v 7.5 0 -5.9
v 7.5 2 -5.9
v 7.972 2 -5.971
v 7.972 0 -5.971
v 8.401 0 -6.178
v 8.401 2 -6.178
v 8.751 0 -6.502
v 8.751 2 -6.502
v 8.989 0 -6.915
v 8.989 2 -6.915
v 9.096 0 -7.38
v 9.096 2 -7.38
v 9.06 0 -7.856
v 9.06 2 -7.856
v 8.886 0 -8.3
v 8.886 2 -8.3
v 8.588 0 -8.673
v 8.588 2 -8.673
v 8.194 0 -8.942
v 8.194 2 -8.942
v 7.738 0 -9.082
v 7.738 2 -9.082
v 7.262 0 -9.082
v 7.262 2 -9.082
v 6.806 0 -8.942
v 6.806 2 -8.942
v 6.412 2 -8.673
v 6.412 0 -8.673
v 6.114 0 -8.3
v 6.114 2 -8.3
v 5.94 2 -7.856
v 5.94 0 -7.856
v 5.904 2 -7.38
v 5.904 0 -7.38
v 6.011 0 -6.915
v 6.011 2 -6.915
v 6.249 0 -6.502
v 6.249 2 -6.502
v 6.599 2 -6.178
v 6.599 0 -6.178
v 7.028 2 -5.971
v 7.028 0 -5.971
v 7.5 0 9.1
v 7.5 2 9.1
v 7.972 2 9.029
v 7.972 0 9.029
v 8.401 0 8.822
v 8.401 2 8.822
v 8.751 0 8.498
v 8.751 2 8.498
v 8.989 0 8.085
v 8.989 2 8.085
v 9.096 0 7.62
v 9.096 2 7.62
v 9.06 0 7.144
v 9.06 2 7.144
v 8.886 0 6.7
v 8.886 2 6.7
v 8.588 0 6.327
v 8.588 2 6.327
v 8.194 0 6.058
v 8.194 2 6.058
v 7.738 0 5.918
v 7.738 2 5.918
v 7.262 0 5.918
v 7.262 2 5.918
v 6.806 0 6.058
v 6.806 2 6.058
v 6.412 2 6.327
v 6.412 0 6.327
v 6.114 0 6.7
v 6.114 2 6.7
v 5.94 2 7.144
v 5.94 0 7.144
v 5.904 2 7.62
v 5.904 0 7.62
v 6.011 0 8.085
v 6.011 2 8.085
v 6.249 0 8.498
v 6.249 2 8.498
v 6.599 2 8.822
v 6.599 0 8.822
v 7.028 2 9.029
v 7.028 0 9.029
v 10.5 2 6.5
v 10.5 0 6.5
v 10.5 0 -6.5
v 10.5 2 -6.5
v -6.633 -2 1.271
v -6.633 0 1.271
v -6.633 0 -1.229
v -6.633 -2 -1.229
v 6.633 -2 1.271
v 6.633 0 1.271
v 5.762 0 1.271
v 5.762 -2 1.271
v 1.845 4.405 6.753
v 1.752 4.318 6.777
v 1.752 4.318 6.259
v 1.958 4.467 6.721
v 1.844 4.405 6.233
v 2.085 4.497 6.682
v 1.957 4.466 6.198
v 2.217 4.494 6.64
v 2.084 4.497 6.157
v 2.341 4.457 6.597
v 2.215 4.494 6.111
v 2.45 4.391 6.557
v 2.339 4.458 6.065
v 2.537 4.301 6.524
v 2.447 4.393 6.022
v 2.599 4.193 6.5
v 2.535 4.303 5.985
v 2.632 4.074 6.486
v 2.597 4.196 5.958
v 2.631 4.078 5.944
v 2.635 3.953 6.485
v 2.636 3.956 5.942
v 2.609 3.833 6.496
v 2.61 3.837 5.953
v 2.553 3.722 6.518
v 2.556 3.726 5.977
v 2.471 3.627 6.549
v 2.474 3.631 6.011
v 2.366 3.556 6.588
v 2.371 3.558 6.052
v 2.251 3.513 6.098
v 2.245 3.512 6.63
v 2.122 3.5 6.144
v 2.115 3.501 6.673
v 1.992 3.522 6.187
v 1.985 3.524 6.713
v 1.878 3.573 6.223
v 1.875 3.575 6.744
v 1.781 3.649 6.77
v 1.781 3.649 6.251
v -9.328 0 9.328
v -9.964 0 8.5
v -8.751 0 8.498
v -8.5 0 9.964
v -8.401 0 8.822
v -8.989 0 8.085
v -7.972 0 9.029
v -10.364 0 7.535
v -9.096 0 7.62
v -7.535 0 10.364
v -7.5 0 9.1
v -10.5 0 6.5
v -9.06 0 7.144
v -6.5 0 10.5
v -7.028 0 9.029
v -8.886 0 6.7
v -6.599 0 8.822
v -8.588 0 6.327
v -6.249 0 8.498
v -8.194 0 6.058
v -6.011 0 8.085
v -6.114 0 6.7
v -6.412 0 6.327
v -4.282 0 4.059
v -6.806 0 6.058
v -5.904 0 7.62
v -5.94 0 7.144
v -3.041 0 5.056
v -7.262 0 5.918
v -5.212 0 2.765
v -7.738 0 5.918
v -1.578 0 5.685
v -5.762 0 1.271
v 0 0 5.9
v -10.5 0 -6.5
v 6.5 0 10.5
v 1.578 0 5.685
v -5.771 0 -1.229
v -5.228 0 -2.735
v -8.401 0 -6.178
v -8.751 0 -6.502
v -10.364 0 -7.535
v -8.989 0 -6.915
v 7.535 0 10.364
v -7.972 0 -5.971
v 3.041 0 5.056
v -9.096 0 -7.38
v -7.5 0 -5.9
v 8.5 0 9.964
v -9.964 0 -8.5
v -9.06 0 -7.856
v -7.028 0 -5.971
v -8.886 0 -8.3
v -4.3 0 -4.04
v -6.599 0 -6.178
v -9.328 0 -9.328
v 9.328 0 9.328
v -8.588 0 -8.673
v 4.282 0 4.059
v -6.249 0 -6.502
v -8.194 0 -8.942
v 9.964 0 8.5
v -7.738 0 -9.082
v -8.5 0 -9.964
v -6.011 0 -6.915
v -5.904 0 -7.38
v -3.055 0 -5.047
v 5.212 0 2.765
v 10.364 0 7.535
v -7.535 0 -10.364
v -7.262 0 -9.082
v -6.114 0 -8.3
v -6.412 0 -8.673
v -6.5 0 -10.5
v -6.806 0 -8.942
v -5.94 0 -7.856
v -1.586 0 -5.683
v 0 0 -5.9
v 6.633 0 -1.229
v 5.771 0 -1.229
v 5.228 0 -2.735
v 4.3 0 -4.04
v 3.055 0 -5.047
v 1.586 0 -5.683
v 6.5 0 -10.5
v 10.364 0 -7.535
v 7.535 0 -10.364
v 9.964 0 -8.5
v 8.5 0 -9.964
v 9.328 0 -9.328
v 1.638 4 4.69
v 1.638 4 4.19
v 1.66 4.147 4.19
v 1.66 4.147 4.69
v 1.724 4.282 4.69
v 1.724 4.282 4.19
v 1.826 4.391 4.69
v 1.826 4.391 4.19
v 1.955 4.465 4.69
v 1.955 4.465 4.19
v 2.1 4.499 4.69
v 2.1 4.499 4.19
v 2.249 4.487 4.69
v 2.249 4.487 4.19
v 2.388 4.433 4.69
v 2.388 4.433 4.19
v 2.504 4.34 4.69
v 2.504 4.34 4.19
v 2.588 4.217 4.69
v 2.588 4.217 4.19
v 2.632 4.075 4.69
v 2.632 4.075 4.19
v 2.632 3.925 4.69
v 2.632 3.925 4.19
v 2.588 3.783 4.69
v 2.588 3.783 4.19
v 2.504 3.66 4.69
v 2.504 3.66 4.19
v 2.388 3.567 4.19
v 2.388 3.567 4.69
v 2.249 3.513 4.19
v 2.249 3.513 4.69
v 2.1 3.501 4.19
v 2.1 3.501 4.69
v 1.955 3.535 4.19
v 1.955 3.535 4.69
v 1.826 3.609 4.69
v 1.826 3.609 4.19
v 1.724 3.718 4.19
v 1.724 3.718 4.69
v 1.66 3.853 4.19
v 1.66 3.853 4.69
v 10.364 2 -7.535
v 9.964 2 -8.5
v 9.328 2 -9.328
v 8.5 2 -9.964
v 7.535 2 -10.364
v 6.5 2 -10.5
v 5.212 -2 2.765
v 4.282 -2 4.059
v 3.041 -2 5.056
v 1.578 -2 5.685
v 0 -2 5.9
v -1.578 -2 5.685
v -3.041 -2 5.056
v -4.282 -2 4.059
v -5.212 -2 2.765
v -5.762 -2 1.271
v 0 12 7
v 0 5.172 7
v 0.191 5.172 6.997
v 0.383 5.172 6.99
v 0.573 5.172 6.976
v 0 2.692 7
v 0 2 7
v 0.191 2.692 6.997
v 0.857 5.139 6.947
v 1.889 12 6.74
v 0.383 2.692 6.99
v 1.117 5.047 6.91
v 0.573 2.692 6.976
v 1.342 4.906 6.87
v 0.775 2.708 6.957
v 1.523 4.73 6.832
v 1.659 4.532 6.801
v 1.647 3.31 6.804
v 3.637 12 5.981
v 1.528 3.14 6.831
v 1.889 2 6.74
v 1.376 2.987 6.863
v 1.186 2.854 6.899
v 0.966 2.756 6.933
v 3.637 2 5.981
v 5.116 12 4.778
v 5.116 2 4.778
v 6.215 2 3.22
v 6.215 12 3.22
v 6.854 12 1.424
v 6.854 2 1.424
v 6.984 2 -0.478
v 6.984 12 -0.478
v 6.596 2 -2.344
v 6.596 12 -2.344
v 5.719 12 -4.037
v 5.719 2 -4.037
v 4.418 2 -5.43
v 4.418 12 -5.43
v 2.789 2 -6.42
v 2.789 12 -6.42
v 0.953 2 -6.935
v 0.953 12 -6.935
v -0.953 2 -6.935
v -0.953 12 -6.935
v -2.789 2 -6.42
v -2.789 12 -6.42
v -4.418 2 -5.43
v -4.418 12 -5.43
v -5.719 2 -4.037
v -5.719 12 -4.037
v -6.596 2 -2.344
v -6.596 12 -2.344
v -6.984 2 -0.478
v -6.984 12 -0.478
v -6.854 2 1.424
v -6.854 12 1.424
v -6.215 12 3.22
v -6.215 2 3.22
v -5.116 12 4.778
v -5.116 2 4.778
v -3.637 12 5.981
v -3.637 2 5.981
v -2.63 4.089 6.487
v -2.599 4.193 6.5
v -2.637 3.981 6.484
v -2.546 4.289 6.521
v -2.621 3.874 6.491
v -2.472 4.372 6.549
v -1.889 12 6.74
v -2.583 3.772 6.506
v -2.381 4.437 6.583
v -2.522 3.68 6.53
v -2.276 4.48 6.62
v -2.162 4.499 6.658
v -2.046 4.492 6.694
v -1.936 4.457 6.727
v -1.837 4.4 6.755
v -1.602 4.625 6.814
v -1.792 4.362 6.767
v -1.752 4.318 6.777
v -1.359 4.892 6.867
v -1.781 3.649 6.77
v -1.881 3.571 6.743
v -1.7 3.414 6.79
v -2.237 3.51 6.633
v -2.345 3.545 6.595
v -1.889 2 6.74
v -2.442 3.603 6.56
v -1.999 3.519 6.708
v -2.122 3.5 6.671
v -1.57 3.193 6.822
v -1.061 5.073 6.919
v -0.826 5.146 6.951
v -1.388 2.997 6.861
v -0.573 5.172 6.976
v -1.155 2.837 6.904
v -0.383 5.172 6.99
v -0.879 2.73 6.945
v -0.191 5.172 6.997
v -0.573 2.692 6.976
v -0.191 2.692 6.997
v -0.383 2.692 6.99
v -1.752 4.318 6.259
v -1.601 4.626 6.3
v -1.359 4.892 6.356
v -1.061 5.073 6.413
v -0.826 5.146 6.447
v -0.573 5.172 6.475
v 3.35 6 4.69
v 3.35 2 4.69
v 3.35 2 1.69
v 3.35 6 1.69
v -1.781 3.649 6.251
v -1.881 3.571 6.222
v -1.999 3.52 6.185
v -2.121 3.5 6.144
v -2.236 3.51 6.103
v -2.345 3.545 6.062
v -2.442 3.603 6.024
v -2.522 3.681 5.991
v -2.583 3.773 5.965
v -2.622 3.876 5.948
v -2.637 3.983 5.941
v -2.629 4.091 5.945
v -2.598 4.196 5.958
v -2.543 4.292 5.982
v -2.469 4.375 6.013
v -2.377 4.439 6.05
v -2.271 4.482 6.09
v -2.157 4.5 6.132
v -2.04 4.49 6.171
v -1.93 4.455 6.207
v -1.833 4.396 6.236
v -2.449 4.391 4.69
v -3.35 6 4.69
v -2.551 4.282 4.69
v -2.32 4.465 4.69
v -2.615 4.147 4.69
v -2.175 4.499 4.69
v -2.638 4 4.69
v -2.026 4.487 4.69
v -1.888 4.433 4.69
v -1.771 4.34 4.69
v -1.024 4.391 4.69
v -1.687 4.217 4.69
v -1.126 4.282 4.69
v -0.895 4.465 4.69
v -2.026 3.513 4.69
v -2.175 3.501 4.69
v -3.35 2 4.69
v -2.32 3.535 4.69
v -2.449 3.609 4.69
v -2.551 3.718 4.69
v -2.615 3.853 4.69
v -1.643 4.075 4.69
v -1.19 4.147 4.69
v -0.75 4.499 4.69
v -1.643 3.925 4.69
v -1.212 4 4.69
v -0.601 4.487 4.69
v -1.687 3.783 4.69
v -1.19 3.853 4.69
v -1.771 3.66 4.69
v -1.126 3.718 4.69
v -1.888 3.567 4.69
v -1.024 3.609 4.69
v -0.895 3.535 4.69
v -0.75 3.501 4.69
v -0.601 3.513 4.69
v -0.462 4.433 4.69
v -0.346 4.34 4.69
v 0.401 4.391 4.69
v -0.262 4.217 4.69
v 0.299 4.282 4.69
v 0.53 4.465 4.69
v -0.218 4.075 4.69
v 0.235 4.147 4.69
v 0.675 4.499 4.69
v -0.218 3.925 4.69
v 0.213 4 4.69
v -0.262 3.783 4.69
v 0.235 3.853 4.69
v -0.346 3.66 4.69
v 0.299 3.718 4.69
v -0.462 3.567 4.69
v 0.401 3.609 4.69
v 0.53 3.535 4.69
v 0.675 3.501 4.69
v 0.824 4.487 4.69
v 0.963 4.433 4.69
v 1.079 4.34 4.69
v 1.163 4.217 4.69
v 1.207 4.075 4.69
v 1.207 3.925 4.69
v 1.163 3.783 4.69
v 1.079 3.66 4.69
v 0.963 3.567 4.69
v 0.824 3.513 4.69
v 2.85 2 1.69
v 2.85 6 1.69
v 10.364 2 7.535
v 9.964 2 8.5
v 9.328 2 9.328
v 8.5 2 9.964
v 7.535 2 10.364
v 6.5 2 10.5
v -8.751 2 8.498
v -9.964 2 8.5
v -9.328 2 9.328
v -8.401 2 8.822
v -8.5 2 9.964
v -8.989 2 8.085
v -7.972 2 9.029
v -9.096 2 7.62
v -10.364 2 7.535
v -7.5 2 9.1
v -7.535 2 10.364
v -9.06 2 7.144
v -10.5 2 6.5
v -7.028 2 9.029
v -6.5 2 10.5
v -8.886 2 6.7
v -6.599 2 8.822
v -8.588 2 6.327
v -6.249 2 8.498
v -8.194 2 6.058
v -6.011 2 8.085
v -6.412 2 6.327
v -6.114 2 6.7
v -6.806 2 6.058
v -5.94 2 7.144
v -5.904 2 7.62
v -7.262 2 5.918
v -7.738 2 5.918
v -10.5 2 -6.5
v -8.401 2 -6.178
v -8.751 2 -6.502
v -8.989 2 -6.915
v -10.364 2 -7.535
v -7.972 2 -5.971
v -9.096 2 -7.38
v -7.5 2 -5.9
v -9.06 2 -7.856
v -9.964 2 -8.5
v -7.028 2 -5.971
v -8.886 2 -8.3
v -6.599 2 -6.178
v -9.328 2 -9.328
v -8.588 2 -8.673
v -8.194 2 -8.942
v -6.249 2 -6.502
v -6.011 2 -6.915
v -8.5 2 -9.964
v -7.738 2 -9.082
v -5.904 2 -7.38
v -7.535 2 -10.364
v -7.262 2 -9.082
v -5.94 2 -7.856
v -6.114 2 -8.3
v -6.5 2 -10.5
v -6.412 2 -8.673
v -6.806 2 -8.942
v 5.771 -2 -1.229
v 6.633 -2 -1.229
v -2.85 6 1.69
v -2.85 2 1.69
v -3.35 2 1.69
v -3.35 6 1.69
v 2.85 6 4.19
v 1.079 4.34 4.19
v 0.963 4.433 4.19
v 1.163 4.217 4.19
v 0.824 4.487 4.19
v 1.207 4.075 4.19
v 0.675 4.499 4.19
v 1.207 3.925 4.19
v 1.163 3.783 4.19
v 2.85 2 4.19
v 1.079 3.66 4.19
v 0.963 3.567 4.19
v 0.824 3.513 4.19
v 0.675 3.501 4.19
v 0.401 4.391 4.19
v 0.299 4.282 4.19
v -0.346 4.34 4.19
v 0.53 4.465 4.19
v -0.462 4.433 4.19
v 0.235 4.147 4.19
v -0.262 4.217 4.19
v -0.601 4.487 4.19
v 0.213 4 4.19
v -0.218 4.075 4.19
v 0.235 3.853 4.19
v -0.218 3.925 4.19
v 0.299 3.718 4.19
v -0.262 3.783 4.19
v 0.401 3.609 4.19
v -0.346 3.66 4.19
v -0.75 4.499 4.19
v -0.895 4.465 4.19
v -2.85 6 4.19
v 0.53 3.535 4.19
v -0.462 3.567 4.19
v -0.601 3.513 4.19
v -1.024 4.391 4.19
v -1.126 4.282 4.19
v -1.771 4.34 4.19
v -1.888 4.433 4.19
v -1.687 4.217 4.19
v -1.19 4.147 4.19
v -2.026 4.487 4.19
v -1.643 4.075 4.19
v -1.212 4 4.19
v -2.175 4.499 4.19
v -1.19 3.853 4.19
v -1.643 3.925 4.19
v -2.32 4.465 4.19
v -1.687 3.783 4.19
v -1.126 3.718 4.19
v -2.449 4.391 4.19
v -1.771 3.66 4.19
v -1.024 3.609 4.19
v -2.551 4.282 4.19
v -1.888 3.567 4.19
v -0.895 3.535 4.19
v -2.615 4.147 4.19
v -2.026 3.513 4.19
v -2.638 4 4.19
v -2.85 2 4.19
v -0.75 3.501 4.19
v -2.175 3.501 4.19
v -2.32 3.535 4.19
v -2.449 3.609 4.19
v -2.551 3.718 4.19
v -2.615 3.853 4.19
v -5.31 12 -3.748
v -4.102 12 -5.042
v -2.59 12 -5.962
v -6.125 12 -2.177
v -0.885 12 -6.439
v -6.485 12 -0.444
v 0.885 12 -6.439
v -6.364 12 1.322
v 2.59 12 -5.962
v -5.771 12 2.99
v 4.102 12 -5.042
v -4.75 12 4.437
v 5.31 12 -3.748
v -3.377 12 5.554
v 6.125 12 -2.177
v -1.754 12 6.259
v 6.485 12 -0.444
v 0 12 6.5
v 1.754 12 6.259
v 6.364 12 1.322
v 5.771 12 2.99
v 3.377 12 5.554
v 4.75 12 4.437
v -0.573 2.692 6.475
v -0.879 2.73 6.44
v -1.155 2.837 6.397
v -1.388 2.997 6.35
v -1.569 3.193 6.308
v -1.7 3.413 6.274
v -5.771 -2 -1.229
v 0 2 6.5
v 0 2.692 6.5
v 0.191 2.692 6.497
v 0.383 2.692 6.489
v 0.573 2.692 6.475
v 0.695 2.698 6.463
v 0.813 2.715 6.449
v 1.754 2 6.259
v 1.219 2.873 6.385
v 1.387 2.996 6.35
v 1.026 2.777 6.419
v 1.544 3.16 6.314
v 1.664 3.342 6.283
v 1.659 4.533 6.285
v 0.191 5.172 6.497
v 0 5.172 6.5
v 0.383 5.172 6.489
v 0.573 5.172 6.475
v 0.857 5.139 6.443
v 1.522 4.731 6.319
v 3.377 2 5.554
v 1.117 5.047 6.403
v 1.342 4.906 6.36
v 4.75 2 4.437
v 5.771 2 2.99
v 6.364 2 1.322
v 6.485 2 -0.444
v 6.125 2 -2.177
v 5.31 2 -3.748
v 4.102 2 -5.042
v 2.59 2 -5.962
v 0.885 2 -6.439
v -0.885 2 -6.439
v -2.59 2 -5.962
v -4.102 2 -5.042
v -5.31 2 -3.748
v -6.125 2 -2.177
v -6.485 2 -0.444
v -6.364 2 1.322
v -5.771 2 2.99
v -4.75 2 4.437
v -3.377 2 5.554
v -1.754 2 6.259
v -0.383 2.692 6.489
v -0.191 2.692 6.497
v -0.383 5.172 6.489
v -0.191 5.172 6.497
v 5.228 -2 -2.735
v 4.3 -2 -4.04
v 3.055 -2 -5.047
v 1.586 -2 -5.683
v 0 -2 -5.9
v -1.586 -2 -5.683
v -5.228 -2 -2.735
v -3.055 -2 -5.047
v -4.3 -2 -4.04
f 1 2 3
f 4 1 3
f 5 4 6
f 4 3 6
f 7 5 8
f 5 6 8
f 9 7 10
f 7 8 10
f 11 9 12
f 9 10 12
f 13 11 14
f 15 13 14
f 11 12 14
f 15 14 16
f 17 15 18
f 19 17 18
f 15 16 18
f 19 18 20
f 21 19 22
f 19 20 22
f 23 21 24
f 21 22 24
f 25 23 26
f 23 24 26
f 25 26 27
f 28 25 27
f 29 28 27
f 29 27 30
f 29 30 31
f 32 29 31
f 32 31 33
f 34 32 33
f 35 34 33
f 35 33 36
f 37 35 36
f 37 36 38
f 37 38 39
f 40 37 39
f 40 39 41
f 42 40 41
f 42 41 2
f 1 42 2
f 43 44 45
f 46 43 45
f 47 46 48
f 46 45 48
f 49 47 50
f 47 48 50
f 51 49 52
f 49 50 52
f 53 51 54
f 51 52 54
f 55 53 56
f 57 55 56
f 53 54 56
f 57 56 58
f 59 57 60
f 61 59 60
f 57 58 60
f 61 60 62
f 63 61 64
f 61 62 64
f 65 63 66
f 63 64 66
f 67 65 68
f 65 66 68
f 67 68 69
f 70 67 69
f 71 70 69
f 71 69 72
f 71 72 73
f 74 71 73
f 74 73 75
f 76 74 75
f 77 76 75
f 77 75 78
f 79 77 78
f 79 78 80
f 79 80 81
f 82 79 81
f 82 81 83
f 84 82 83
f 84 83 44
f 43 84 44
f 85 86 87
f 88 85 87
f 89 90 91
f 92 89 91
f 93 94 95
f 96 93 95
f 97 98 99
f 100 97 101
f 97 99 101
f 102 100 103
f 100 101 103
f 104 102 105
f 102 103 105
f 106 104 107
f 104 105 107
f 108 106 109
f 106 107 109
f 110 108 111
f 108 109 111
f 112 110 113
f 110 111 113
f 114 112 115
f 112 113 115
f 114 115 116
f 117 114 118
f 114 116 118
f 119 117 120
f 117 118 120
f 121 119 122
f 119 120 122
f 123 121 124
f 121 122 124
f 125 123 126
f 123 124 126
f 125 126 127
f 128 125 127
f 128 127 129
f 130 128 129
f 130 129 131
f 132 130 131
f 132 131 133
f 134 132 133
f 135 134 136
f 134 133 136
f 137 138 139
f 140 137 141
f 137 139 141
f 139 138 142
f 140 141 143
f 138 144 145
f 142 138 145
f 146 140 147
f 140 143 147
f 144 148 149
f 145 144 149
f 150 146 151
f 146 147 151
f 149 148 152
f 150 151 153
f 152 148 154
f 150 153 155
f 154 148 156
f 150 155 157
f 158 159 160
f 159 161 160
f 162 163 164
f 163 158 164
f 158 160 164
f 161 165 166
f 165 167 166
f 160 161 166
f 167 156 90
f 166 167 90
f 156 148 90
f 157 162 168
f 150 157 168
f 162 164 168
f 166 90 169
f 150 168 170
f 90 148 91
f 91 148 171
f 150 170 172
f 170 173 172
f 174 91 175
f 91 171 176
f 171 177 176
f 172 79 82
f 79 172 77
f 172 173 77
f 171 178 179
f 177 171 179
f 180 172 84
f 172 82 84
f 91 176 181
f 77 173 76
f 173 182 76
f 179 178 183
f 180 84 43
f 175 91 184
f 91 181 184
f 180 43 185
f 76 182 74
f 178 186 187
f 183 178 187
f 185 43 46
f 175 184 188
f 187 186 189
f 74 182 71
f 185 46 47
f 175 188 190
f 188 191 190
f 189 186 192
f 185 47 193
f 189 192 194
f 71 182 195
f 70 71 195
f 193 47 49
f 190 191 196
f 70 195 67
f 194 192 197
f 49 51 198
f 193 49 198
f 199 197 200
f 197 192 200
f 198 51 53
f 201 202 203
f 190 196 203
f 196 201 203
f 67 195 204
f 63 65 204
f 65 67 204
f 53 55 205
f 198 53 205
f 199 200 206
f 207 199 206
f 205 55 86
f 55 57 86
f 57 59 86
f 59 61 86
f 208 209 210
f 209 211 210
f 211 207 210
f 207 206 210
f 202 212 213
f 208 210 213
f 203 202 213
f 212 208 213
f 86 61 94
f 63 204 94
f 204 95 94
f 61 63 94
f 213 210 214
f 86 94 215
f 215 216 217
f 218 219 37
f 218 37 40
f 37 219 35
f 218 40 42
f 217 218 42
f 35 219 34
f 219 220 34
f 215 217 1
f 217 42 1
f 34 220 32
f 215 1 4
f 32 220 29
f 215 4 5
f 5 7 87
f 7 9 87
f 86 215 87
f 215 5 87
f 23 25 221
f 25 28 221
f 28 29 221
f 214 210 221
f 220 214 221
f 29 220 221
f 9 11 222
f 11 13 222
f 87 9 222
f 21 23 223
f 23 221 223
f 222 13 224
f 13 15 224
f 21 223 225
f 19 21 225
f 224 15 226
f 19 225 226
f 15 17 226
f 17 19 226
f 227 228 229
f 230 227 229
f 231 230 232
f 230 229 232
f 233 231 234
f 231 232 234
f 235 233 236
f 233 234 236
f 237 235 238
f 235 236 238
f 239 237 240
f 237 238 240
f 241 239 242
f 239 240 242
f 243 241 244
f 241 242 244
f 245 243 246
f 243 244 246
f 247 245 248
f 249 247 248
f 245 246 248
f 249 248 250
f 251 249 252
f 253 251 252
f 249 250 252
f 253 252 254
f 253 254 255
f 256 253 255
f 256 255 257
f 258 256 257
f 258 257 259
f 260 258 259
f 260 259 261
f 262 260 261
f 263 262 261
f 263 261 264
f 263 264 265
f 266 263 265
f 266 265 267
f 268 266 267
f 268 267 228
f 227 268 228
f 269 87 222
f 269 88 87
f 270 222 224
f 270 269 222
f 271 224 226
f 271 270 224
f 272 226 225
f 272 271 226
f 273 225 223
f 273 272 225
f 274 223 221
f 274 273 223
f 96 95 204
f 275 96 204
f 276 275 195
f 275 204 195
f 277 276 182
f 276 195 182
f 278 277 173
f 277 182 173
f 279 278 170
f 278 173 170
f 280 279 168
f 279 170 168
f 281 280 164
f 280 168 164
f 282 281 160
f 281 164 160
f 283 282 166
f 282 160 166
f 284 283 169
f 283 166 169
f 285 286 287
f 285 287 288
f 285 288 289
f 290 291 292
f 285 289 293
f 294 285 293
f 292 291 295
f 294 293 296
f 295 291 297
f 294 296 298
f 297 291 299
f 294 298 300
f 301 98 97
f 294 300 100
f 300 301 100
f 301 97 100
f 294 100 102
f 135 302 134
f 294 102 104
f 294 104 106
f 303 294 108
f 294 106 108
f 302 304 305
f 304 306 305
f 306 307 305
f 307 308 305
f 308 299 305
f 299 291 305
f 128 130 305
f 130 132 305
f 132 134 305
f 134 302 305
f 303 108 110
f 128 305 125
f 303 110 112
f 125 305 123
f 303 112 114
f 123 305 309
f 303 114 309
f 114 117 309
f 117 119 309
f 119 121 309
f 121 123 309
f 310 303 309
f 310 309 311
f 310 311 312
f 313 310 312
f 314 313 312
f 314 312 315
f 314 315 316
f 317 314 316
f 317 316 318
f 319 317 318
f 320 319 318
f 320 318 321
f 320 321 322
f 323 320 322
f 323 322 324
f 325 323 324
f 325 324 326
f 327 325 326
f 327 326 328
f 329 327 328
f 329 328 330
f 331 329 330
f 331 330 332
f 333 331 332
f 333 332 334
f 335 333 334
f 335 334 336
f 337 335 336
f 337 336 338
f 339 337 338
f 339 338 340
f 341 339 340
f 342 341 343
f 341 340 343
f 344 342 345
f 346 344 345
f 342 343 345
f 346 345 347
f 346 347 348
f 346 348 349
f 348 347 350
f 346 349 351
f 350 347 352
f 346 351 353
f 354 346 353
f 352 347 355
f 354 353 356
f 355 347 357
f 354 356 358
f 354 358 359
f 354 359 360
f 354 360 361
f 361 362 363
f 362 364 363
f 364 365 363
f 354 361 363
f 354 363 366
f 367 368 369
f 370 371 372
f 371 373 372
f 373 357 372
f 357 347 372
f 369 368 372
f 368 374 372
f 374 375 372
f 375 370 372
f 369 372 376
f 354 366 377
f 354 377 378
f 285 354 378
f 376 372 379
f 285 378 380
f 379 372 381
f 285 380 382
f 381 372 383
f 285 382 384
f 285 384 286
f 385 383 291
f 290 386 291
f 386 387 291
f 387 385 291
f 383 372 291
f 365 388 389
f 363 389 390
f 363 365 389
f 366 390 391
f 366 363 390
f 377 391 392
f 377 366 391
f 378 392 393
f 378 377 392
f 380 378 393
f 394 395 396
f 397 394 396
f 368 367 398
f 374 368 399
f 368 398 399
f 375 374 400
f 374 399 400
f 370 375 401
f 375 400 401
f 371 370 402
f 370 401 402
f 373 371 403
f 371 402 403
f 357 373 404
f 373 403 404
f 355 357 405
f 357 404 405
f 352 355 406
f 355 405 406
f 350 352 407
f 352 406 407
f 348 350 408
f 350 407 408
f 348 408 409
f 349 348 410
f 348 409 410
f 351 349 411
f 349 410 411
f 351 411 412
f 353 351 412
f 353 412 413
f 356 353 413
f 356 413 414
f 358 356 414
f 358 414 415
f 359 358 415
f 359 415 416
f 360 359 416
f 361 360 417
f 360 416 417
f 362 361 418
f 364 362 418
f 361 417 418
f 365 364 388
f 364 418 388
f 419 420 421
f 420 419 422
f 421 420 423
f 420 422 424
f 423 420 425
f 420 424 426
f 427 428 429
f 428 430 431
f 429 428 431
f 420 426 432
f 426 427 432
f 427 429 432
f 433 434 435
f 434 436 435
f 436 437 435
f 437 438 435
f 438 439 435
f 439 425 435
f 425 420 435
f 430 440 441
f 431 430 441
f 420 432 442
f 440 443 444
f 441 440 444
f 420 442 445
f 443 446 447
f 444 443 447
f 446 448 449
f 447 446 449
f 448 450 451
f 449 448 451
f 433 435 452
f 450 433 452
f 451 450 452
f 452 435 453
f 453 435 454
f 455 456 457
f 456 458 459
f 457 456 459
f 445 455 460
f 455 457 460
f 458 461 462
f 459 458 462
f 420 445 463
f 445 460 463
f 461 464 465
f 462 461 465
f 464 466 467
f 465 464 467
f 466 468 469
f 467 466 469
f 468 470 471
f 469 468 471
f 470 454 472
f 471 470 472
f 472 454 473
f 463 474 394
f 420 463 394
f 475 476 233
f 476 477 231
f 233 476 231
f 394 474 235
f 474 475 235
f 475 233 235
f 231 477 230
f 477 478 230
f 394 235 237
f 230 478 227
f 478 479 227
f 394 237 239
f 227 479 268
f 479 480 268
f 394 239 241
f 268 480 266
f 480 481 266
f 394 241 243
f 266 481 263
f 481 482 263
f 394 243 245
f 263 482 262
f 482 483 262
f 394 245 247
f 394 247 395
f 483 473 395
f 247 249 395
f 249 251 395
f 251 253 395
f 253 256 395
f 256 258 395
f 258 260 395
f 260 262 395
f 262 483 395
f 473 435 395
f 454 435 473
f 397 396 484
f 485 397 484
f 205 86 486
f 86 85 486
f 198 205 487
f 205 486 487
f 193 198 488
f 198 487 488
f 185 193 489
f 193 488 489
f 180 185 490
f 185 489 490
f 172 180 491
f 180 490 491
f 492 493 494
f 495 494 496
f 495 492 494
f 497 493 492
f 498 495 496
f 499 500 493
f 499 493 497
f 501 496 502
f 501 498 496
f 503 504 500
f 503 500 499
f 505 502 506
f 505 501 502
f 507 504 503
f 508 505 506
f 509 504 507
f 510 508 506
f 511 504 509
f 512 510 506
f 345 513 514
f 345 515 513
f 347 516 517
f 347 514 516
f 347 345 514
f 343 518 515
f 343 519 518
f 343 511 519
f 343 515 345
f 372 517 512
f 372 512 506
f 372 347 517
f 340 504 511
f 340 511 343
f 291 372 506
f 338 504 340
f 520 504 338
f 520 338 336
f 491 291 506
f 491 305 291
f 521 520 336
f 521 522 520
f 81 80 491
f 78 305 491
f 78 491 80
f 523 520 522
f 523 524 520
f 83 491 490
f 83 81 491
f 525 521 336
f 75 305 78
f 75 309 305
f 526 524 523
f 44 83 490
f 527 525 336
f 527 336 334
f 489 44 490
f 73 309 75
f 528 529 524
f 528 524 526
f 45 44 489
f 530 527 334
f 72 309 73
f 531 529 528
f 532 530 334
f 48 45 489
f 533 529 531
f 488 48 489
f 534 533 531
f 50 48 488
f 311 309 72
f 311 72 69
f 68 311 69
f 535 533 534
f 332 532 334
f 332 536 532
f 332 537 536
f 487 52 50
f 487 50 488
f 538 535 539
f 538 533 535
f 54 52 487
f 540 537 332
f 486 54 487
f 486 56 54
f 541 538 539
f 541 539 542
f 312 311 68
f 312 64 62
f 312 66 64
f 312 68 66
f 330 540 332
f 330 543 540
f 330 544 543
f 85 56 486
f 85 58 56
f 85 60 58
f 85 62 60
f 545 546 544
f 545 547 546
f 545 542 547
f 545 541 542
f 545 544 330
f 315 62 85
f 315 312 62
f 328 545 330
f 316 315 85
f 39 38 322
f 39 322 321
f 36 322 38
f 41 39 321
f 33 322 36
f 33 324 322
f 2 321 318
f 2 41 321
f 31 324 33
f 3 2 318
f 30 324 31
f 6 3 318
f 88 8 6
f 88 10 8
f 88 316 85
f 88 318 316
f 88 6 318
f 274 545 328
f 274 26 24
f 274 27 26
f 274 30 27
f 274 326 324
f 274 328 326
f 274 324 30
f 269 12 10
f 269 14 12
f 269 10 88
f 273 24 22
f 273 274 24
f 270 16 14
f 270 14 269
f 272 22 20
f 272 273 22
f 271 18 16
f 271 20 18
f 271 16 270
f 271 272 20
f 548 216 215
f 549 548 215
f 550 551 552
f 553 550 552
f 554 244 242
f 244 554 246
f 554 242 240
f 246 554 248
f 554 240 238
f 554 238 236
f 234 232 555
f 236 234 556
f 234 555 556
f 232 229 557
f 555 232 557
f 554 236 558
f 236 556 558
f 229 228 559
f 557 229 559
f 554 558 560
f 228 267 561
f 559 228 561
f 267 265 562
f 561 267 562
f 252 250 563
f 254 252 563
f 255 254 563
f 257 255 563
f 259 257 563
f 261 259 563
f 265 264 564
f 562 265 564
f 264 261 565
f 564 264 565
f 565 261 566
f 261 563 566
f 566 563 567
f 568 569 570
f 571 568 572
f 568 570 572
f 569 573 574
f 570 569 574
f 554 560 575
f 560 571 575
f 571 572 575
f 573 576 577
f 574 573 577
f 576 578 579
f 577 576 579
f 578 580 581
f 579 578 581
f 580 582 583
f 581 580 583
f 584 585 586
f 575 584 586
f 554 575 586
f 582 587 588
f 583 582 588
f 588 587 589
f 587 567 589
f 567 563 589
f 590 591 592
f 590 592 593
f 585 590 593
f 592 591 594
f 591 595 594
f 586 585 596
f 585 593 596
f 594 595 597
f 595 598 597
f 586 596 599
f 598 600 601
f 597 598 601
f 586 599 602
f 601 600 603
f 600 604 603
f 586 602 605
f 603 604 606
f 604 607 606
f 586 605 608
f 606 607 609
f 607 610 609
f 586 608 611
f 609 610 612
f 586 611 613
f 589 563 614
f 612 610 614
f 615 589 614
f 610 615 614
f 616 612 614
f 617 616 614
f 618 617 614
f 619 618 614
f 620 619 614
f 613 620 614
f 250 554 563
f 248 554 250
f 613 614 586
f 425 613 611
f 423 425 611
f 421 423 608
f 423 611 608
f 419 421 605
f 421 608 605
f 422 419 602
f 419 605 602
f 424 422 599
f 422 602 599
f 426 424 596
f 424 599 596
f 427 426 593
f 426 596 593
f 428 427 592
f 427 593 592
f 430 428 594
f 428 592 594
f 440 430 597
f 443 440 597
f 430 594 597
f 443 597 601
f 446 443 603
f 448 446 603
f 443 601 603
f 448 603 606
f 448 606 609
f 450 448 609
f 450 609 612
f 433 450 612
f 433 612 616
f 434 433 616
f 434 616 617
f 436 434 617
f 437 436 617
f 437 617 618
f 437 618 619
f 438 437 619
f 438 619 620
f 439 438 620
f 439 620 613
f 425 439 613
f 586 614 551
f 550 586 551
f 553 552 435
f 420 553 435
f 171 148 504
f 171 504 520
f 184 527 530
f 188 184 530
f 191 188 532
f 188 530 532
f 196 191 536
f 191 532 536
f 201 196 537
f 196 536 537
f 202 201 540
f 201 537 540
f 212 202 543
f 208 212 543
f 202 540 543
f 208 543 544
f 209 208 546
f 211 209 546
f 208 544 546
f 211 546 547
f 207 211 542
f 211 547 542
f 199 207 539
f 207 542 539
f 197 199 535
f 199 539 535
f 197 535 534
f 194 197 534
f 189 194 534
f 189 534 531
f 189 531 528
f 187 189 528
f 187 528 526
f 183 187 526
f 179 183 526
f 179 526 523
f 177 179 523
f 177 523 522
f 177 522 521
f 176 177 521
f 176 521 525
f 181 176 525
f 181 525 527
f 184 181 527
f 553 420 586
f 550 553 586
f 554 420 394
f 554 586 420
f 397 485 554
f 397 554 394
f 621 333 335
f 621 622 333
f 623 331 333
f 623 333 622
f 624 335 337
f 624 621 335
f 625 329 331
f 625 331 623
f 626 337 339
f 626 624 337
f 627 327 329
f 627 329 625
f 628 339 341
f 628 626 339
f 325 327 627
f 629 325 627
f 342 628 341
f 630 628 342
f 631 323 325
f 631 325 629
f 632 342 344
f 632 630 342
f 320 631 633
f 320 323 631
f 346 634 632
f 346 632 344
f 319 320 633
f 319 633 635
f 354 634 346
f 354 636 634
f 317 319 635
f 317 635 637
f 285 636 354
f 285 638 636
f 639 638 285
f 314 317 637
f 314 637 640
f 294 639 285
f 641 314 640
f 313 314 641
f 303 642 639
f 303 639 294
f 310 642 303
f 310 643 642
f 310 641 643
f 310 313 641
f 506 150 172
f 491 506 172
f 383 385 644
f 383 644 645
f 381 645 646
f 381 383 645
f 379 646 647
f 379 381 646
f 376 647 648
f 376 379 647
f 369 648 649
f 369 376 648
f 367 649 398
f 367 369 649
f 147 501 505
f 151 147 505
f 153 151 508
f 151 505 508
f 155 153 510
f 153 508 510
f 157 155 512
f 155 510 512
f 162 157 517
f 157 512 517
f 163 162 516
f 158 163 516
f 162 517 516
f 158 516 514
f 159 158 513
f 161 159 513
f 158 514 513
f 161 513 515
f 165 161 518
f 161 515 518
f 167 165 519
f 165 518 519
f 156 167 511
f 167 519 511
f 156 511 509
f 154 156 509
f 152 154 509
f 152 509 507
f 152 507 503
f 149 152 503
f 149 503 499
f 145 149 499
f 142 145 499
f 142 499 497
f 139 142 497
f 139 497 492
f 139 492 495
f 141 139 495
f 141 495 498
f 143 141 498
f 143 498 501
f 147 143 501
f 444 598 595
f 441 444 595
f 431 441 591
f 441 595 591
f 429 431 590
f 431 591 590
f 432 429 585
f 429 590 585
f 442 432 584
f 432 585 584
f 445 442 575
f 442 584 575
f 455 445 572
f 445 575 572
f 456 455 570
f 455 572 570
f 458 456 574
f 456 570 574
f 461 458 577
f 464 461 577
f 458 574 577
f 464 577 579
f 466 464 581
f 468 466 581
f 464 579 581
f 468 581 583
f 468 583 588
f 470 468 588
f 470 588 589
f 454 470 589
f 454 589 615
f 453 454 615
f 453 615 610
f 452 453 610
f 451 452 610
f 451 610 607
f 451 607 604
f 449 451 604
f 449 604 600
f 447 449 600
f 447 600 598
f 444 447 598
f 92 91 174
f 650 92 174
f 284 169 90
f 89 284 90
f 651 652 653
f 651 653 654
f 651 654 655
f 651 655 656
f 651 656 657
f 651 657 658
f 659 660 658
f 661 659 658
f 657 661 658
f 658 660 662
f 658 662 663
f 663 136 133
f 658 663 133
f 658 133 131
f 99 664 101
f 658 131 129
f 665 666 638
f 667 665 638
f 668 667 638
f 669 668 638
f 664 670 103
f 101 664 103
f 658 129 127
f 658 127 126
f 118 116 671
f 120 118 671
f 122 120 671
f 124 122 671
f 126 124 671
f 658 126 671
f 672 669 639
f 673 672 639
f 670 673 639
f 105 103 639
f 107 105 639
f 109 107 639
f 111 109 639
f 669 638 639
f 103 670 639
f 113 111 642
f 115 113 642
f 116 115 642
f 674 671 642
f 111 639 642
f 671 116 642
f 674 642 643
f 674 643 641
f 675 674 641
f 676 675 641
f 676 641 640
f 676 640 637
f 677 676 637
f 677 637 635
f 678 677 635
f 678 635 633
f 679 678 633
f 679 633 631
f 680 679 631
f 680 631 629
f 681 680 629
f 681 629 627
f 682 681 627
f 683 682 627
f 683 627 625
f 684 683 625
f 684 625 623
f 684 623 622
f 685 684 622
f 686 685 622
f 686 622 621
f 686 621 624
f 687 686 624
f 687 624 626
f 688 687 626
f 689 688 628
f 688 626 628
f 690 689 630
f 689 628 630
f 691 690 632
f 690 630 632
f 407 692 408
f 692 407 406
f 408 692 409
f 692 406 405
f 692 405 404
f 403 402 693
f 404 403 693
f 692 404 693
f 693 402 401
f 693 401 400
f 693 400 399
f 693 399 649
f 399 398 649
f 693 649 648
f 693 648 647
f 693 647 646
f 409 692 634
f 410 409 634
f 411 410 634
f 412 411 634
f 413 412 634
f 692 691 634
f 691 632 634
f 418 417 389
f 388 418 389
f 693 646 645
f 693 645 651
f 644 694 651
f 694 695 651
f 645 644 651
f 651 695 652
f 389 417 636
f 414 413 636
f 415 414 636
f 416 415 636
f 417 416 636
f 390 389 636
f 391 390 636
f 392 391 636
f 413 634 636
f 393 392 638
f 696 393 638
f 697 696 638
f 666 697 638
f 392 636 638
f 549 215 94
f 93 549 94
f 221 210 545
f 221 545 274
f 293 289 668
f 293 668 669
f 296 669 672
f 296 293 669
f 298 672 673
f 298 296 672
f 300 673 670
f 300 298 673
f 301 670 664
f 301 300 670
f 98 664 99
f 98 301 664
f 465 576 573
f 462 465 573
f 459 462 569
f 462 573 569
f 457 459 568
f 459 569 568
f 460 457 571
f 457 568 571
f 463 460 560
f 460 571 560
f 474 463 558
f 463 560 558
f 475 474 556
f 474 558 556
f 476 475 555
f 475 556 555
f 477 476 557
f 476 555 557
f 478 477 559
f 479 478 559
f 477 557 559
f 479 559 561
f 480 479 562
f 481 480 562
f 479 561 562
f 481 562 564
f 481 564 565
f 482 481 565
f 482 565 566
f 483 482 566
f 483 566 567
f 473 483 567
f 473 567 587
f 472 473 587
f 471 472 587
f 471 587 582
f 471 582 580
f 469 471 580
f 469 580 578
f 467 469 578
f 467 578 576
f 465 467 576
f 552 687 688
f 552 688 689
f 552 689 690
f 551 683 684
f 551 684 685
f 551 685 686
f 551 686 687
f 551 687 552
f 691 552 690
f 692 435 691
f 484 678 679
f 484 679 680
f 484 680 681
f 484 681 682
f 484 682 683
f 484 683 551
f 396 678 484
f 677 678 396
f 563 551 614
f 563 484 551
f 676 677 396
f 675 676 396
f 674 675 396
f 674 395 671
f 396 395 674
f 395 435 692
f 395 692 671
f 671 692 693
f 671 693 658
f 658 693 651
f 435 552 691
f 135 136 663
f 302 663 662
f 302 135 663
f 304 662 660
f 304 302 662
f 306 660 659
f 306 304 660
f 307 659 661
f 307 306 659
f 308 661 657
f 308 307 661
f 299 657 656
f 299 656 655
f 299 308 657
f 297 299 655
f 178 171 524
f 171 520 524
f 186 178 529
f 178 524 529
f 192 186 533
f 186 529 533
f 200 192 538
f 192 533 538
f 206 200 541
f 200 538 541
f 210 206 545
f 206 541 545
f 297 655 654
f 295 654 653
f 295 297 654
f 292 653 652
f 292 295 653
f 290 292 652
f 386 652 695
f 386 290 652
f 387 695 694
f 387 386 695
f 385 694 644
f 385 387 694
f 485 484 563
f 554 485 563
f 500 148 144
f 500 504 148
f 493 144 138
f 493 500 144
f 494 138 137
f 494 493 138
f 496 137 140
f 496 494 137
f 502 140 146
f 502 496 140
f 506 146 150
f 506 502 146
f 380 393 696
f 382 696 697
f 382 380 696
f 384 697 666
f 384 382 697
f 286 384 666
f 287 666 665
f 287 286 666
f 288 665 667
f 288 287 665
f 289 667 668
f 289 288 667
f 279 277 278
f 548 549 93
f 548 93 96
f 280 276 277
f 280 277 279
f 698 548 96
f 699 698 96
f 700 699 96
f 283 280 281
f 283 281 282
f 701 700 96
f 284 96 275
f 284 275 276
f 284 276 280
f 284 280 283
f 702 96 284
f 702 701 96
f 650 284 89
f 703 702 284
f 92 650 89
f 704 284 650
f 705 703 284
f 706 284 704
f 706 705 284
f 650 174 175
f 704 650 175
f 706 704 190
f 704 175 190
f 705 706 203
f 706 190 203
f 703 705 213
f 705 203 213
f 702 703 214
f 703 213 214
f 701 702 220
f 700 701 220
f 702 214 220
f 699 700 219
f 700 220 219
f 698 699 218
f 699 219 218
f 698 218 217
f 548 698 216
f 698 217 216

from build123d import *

# Parameters (mm, degrees)
SKETCH1_W               = 21
SKETCH1_H               = 21
BOSS_EXTRUDE1_DEPTH     = 2
BOSS_EXTRUDE2_START     = -2
BOSS_EXTRUDE2_DEPTH     = 2
SKETCH3_R               = 1.6
CUT_EXTRUDE1_DEPTH      = 16.378556499
SKETCH5_R               = 7
BOSS_EXTRUDE3_DEPTH     = 10
SKETCH6_R               = 6.5
CUT_EXTRUDE2_DEPTH      = 10
CUT_EXTRUDE3_REACH      = 25.675
CUT_EXTRUDE3_END_RADIUS = 6.5
BOSS_EXTRUDE4_DEPTH     = 4
SKETCH14_R              = 0.5
CUT_EXTRUDE4_DEPTH      = 10
FILLET1_R               = 4


with BuildPart() as part:
    # Sketch1 → Boss-Extrude1 (new body)
    with BuildSketch(Plane(origin=(0, 0, 0), x_dir=(1, 0, 0), z_dir=(0, 1, 0))):
        Rectangle(SKETCH1_W, SKETCH1_H)
    extrude(amount=BOSS_EXTRUDE1_DEPTH)

    # Sketch4 → Boss-Extrude2 (add)
    with BuildSketch(Plane(origin=(0, 2, 0), x_dir=(1, 0, 0), z_dir=(0, 1, 0)).offset(BOSS_EXTRUDE2_START)):
        with BuildLine():
            Line((-5.761508712, -1.270833333), (-6.632541509, -1.270833333))
            Line((-6.632541509, -1.270833333), (-6.632541509, 1.229166667))
            Line((-6.632541509, 1.229166667), (-5.770541509, 1.229166667))
            ThreePointArc((-5.770541509, 1.229166667), (0, 5.9), (5.770541509, 1.229166667))
            Line((5.770541509, 1.229166667), (6.632541509, 1.229166667))
            Line((6.632541509, 1.229166667), (6.632541509, -1.270833333))
            Line((6.632541509, -1.270833333), (5.761508712, -1.270833333))
            ThreePointArc((5.761508712, -1.270833333), (0, -5.9), (-5.761508712, -1.270833333))
        make_face()
    extrude(amount=-BOSS_EXTRUDE2_DEPTH)

    # Sketch3 → Cut-Extrude1 (cut, through all)
    with BuildSketch(Plane(origin=(0, 2, 0), x_dir=(1, 0, 0), z_dir=(0, 1, 0))):
        with Locations(Location((-7.5, 7.5, 0), (0, 0, 270))):
            Circle(SKETCH3_R)
        with Locations(Location((7.5, 7.5, 0), (0, 0, 270))):
            Circle(SKETCH3_R)
        with Locations(Location((7.5, -7.5, 0), (0, 0, 270))):
            Circle(SKETCH3_R)
        with Locations(Location((-7.5, -7.5, 0), (0, 0, 270))):
            Circle(SKETCH3_R)
    extrude(amount=-CUT_EXTRUDE1_DEPTH, mode=Mode.SUBTRACT)

    # Sketch5 → Boss-Extrude3 (add)
    with BuildSketch(Plane(origin=(0, 2, 0), x_dir=(1, 0, 0), z_dir=(0, 1, 0))):
        with Locations(Location((0, 0, 0), (0, 0, 270))):
            Circle(SKETCH5_R)
    extrude(amount=BOSS_EXTRUDE3_DEPTH)

    # Sketch6 → Cut-Extrude2 (cut)
    with BuildSketch(Plane(origin=(0, 12, 0), x_dir=(1, 0, 0), z_dir=(0, 1, 0))):
        with Locations(Location((0, 0, 0), (0, 0, 270))):
            Circle(SKETCH6_R)
    extrude(amount=-CUT_EXTRUDE2_DEPTH, mode=Mode.SUBTRACT)

    # Cut-Extrude3: up to this cylinder (the profile starts outside it)
    cut_extrude3_end = Plane(origin=(0, 3.932073, 0), z_dir=(0, 1, 0)) * Cylinder(CUT_EXTRUDE3_END_RADIUS, 65.35, mode=Mode.PRIVATE)
    # Sketch12 → Cut-Extrude3 (cut, up to the surface)
    with BuildSketch(Plane.XY.offset(7), mode=Mode.PRIVATE) as cut_extrude3_sk1:
        with BuildLine():
            Line((0.5734508, 2.691842334), (-0.5734508, 2.691842334))
            ThreePointArc((-0.5734508, 2.691842334), (-1.813681206, 3.93207274), (-0.5734508, 5.172303147))
            Line((-0.5734508, 5.172303147), (0.5734508, 5.172303147))
            ThreePointArc((0.5734508, 5.172303147), (1.813681206, 3.93207274), (0.5734508, 2.691842334))
        make_face()
    cut_extrude3_tool1 = extrude(cut_extrude3_sk1.sketch, amount=-CUT_EXTRUDE3_REACH, mode=Mode.PRIVATE) - cut_extrude3_end
    add(cut_extrude3_tool1.solids().sort_by_distance((0, 3.932073, 7))[0], mode=Mode.SUBTRACT)

    # Sketch13 → Boss-Extrude4 (add)
    with BuildSketch(Plane(origin=(0, 2, 0), x_dir=(1, 0, 0), z_dir=(0, 1, 0))):
        Polygon((-2.85, -4.69012427), (2.85, -4.69012427), (3.35, -4.69012427), (3.35, -1.69012427), (2.85, -1.69012427), (2.85, -4.19012427), (-2.85, -4.19012427), (-2.85, -1.69012427), (-3.35, -1.69012427), (-3.35, -4.69012427), align=None)
    extrude(amount=BOSS_EXTRUDE4_DEPTH)

    # Sketch14 → Cut-Extrude4 (cut)
    with BuildSketch(Plane(origin=(0, 0, 4.19012427), x_dir=(-1, 0, 0), z_dir=(0, 0, -1))):
        with Locations((-2.1375, 4)):
            Circle(SKETCH14_R)
        with Locations((-0.7125, 4)):
            Circle(SKETCH14_R)
        with Locations((0.7125, 4)):
            Circle(SKETCH14_R)
        with Locations((2.1375, 4)):
            Circle(SKETCH14_R)
    extrude(amount=-CUT_EXTRUDE4_DEPTH, mode=Mode.SUBTRACT)

    # Fillet1
    fillet1_edges = [part.edges().sort_by_distance(p)[0] for p in [
        (-10.5, 1, -10.5),
        (10.5, 1, -10.5),
        (10.5, 1, 10.5),
        (-10.5, 1, 10.5),
    ]]
    fillet(fillet1_edges, radius=FILLET1_R)


solid = part.part
